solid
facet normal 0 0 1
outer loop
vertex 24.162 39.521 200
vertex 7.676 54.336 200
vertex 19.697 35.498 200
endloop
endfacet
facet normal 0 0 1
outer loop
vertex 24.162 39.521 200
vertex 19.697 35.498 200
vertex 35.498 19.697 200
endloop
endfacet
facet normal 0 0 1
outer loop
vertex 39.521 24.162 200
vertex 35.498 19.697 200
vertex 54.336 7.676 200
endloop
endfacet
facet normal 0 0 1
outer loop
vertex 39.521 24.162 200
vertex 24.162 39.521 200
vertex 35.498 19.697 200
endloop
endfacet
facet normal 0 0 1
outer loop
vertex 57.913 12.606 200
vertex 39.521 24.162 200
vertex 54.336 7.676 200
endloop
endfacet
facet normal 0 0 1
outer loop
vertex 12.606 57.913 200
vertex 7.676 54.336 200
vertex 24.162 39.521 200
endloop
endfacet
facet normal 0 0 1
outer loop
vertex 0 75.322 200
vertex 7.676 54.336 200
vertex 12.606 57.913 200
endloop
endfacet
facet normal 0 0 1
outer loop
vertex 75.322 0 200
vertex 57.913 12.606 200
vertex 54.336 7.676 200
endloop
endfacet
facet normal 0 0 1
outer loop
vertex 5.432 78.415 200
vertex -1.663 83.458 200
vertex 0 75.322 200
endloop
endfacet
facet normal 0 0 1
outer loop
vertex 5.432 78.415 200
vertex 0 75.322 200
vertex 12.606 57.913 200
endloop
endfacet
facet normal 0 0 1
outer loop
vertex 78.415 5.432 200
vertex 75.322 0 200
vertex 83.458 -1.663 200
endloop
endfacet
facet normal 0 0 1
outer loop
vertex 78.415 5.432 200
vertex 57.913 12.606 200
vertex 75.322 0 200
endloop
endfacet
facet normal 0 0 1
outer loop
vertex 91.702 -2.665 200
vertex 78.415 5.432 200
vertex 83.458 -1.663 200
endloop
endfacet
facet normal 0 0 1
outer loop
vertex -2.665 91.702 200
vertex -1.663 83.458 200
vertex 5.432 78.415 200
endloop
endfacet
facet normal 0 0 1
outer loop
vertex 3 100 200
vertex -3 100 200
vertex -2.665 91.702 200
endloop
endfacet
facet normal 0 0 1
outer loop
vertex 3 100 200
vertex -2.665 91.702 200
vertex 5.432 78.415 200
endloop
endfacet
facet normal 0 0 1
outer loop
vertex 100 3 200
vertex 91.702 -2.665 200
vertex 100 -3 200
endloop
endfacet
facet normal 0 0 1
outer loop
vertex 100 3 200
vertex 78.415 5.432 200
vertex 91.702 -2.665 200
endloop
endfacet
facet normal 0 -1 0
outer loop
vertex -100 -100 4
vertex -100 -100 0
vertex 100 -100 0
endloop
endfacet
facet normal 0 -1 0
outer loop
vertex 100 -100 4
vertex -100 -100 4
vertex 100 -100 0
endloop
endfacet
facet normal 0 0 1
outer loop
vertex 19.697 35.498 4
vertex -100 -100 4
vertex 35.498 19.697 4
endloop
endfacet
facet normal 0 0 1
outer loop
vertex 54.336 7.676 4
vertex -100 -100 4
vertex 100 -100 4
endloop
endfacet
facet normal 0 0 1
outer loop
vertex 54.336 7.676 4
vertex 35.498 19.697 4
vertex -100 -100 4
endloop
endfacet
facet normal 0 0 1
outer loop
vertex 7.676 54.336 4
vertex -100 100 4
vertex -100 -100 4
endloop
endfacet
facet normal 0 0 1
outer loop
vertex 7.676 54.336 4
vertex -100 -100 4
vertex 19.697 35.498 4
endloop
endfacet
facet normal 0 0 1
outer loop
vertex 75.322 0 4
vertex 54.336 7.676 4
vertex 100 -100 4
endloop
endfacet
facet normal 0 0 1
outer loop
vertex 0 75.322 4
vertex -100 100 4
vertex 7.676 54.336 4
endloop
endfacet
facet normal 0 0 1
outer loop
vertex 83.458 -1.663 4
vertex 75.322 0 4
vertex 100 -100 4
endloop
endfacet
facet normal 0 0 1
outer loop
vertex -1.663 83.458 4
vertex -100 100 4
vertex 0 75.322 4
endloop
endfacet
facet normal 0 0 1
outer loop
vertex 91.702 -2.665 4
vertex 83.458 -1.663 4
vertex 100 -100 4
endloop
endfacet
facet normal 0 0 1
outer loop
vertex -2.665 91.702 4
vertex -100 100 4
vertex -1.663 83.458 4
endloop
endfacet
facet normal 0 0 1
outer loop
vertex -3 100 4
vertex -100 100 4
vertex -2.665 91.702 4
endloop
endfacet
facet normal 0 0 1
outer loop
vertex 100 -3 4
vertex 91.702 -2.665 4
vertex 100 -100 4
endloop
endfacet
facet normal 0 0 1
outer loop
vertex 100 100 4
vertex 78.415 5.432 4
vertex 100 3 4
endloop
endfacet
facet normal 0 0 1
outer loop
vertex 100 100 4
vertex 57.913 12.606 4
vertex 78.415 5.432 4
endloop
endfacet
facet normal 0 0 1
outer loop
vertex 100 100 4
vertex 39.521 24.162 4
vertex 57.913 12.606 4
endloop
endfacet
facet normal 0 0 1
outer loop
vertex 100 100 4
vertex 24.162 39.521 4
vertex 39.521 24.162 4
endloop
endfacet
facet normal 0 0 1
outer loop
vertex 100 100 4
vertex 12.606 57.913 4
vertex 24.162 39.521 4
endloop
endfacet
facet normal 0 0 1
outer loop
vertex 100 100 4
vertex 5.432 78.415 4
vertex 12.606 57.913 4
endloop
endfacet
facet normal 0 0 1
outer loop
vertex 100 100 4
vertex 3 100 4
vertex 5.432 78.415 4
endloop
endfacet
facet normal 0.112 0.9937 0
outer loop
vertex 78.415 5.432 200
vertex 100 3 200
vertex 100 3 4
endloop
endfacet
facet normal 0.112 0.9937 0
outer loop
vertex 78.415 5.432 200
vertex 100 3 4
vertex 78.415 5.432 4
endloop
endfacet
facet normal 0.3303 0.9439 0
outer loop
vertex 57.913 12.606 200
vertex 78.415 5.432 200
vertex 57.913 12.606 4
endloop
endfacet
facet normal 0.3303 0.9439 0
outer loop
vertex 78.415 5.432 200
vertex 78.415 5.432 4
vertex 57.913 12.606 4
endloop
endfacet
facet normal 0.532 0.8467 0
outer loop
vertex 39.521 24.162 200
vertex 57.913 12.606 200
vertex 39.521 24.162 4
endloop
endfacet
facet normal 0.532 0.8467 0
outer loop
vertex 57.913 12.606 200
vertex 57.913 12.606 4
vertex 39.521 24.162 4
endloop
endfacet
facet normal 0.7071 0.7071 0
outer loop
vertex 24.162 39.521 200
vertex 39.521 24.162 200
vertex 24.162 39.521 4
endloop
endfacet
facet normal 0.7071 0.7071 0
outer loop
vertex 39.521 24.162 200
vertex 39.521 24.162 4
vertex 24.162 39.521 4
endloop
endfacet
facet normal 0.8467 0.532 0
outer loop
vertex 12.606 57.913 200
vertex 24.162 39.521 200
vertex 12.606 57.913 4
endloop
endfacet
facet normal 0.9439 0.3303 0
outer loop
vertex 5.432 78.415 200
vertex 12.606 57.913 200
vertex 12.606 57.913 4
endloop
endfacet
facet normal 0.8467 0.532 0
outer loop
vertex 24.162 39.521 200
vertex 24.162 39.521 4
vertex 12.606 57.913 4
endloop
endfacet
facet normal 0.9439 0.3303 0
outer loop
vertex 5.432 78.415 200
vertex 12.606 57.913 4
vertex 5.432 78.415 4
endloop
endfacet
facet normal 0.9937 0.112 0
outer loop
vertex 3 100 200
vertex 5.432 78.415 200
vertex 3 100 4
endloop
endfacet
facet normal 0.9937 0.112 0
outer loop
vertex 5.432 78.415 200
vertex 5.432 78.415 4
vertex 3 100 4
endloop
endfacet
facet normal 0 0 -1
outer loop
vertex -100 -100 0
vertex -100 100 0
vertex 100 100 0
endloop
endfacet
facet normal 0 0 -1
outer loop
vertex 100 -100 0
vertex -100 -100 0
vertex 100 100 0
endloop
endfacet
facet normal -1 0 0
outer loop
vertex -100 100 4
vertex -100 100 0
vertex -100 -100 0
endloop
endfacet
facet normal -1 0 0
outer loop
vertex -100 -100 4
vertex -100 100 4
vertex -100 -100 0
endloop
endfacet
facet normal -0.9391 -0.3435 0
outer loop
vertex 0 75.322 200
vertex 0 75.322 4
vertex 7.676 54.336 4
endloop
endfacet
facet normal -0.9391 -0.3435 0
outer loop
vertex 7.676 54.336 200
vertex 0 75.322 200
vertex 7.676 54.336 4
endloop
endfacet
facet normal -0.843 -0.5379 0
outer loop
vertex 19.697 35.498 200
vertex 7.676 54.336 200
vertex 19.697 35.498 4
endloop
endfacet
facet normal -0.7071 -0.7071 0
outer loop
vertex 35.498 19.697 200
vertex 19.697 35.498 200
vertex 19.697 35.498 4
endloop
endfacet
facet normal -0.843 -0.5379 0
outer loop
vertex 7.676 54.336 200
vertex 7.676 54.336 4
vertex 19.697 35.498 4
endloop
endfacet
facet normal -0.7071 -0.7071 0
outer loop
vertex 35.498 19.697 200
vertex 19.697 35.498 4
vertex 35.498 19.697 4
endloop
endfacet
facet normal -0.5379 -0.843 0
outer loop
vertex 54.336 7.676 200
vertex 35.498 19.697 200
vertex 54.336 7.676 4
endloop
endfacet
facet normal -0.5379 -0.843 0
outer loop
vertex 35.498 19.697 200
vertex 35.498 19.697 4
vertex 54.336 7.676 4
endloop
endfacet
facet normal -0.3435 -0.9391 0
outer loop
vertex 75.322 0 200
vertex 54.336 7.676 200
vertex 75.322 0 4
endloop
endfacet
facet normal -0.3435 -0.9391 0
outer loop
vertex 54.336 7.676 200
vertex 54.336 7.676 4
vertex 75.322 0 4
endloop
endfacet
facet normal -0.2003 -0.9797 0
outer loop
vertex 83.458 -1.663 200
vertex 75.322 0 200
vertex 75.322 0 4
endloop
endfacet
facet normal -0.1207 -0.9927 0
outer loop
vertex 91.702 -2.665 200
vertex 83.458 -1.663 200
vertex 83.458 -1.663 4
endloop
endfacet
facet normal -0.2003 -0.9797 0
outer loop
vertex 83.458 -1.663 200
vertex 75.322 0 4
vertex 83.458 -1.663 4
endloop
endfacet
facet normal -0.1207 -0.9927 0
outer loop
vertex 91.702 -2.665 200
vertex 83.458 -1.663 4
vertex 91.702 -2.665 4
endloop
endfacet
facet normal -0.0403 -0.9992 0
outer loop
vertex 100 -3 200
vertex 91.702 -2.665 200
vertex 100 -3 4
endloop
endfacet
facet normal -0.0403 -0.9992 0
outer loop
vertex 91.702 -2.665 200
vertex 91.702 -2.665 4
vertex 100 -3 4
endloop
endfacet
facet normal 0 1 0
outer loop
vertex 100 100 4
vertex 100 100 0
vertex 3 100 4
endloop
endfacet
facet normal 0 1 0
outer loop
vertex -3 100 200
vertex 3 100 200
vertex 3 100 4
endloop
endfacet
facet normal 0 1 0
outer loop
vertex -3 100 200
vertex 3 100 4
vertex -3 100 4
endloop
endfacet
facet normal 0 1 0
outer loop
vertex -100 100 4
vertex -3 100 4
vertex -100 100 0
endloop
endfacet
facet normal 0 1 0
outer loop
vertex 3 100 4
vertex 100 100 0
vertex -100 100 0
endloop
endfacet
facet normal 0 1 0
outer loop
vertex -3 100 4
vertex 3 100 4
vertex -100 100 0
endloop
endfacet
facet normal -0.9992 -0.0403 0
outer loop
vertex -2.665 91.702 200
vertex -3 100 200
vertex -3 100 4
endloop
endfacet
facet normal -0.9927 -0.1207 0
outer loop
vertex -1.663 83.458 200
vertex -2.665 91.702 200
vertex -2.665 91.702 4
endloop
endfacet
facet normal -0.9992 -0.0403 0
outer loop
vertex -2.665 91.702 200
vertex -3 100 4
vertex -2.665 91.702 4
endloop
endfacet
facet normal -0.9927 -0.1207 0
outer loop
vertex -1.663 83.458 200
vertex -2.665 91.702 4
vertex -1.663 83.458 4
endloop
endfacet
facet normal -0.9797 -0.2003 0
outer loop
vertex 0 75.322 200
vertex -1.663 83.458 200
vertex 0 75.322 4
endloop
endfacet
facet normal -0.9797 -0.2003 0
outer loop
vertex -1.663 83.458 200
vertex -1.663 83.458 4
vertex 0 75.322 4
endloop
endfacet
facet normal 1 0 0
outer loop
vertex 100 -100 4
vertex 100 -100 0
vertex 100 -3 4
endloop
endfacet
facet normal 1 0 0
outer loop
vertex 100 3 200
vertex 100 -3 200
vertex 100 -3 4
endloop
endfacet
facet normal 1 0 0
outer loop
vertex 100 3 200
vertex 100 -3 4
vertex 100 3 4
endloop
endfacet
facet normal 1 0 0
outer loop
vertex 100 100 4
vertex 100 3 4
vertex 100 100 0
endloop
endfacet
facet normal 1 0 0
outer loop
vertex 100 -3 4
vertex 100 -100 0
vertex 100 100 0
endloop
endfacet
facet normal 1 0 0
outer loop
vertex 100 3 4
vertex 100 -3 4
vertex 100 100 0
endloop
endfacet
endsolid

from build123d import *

# Parameters (mm, degrees)
SZKIC1_W                    = 100
SZKIC1_H                    = 100
DODANIE_WYCI_GNI_CIE1_DEPTH = 4
DODANIE_WYCI_GNI_CIE5_DEPTH = 196


with BuildPart() as part:
    # Szkic1 → Dodanie-wyciągnięcie1 (new body)
    with BuildSketch(Plane.XY):
        with Locations((-50, 50)):
            Rectangle(SZKIC1_W, SZKIC1_H)
        with Locations((50, 50)):
            Rectangle(SZKIC1_W, SZKIC1_H)
        with Locations((50, -50)):
            Rectangle(SZKIC1_W, SZKIC1_H)
        with Locations((-50, -50)):
            Rectangle(SZKIC1_W, SZKIC1_H)
    extrude(amount=DODANIE_WYCI_GNI_CIE1_DEPTH)

    # Szkic2 → Dodanie-wyciągnięcie5 (add)
    with BuildSketch(Plane.XY.offset(4)):
        with BuildLine():
            Line((0, 100), (0, 75.322074641))
            ThreePointArc((0, 75.322074641), (27.168001538, 27.168001538), (75.322074641, 0))
            Line((75.322074641, 0), (100, 0))
            Line((100, 0), (100, 3))
            ThreePointArc((100, 3), (31.410642225, 31.410642225), (3, 100))
            Line((3, 100), (0, 100))
        make_face()
        with BuildLine():
            Line((100, 0), (75.322074641, 0))
            ThreePointArc((75.322074641, 0), (87.570197105, -2.247249352), (100, -3))
            Line((100, -3), (100, 0))
        make_face()
        with BuildLine():
            ThreePointArc((-3, 100), (-2.247249352, 87.570197105), (0, 75.322074641))
            Line((0, 75.322074641), (0, 100))
            Line((0, 100), (-3, 100))
        make_face()
    extrude(amount=DODANIE_WYCI_GNI_CIE5_DEPTH)


solid = part.part
